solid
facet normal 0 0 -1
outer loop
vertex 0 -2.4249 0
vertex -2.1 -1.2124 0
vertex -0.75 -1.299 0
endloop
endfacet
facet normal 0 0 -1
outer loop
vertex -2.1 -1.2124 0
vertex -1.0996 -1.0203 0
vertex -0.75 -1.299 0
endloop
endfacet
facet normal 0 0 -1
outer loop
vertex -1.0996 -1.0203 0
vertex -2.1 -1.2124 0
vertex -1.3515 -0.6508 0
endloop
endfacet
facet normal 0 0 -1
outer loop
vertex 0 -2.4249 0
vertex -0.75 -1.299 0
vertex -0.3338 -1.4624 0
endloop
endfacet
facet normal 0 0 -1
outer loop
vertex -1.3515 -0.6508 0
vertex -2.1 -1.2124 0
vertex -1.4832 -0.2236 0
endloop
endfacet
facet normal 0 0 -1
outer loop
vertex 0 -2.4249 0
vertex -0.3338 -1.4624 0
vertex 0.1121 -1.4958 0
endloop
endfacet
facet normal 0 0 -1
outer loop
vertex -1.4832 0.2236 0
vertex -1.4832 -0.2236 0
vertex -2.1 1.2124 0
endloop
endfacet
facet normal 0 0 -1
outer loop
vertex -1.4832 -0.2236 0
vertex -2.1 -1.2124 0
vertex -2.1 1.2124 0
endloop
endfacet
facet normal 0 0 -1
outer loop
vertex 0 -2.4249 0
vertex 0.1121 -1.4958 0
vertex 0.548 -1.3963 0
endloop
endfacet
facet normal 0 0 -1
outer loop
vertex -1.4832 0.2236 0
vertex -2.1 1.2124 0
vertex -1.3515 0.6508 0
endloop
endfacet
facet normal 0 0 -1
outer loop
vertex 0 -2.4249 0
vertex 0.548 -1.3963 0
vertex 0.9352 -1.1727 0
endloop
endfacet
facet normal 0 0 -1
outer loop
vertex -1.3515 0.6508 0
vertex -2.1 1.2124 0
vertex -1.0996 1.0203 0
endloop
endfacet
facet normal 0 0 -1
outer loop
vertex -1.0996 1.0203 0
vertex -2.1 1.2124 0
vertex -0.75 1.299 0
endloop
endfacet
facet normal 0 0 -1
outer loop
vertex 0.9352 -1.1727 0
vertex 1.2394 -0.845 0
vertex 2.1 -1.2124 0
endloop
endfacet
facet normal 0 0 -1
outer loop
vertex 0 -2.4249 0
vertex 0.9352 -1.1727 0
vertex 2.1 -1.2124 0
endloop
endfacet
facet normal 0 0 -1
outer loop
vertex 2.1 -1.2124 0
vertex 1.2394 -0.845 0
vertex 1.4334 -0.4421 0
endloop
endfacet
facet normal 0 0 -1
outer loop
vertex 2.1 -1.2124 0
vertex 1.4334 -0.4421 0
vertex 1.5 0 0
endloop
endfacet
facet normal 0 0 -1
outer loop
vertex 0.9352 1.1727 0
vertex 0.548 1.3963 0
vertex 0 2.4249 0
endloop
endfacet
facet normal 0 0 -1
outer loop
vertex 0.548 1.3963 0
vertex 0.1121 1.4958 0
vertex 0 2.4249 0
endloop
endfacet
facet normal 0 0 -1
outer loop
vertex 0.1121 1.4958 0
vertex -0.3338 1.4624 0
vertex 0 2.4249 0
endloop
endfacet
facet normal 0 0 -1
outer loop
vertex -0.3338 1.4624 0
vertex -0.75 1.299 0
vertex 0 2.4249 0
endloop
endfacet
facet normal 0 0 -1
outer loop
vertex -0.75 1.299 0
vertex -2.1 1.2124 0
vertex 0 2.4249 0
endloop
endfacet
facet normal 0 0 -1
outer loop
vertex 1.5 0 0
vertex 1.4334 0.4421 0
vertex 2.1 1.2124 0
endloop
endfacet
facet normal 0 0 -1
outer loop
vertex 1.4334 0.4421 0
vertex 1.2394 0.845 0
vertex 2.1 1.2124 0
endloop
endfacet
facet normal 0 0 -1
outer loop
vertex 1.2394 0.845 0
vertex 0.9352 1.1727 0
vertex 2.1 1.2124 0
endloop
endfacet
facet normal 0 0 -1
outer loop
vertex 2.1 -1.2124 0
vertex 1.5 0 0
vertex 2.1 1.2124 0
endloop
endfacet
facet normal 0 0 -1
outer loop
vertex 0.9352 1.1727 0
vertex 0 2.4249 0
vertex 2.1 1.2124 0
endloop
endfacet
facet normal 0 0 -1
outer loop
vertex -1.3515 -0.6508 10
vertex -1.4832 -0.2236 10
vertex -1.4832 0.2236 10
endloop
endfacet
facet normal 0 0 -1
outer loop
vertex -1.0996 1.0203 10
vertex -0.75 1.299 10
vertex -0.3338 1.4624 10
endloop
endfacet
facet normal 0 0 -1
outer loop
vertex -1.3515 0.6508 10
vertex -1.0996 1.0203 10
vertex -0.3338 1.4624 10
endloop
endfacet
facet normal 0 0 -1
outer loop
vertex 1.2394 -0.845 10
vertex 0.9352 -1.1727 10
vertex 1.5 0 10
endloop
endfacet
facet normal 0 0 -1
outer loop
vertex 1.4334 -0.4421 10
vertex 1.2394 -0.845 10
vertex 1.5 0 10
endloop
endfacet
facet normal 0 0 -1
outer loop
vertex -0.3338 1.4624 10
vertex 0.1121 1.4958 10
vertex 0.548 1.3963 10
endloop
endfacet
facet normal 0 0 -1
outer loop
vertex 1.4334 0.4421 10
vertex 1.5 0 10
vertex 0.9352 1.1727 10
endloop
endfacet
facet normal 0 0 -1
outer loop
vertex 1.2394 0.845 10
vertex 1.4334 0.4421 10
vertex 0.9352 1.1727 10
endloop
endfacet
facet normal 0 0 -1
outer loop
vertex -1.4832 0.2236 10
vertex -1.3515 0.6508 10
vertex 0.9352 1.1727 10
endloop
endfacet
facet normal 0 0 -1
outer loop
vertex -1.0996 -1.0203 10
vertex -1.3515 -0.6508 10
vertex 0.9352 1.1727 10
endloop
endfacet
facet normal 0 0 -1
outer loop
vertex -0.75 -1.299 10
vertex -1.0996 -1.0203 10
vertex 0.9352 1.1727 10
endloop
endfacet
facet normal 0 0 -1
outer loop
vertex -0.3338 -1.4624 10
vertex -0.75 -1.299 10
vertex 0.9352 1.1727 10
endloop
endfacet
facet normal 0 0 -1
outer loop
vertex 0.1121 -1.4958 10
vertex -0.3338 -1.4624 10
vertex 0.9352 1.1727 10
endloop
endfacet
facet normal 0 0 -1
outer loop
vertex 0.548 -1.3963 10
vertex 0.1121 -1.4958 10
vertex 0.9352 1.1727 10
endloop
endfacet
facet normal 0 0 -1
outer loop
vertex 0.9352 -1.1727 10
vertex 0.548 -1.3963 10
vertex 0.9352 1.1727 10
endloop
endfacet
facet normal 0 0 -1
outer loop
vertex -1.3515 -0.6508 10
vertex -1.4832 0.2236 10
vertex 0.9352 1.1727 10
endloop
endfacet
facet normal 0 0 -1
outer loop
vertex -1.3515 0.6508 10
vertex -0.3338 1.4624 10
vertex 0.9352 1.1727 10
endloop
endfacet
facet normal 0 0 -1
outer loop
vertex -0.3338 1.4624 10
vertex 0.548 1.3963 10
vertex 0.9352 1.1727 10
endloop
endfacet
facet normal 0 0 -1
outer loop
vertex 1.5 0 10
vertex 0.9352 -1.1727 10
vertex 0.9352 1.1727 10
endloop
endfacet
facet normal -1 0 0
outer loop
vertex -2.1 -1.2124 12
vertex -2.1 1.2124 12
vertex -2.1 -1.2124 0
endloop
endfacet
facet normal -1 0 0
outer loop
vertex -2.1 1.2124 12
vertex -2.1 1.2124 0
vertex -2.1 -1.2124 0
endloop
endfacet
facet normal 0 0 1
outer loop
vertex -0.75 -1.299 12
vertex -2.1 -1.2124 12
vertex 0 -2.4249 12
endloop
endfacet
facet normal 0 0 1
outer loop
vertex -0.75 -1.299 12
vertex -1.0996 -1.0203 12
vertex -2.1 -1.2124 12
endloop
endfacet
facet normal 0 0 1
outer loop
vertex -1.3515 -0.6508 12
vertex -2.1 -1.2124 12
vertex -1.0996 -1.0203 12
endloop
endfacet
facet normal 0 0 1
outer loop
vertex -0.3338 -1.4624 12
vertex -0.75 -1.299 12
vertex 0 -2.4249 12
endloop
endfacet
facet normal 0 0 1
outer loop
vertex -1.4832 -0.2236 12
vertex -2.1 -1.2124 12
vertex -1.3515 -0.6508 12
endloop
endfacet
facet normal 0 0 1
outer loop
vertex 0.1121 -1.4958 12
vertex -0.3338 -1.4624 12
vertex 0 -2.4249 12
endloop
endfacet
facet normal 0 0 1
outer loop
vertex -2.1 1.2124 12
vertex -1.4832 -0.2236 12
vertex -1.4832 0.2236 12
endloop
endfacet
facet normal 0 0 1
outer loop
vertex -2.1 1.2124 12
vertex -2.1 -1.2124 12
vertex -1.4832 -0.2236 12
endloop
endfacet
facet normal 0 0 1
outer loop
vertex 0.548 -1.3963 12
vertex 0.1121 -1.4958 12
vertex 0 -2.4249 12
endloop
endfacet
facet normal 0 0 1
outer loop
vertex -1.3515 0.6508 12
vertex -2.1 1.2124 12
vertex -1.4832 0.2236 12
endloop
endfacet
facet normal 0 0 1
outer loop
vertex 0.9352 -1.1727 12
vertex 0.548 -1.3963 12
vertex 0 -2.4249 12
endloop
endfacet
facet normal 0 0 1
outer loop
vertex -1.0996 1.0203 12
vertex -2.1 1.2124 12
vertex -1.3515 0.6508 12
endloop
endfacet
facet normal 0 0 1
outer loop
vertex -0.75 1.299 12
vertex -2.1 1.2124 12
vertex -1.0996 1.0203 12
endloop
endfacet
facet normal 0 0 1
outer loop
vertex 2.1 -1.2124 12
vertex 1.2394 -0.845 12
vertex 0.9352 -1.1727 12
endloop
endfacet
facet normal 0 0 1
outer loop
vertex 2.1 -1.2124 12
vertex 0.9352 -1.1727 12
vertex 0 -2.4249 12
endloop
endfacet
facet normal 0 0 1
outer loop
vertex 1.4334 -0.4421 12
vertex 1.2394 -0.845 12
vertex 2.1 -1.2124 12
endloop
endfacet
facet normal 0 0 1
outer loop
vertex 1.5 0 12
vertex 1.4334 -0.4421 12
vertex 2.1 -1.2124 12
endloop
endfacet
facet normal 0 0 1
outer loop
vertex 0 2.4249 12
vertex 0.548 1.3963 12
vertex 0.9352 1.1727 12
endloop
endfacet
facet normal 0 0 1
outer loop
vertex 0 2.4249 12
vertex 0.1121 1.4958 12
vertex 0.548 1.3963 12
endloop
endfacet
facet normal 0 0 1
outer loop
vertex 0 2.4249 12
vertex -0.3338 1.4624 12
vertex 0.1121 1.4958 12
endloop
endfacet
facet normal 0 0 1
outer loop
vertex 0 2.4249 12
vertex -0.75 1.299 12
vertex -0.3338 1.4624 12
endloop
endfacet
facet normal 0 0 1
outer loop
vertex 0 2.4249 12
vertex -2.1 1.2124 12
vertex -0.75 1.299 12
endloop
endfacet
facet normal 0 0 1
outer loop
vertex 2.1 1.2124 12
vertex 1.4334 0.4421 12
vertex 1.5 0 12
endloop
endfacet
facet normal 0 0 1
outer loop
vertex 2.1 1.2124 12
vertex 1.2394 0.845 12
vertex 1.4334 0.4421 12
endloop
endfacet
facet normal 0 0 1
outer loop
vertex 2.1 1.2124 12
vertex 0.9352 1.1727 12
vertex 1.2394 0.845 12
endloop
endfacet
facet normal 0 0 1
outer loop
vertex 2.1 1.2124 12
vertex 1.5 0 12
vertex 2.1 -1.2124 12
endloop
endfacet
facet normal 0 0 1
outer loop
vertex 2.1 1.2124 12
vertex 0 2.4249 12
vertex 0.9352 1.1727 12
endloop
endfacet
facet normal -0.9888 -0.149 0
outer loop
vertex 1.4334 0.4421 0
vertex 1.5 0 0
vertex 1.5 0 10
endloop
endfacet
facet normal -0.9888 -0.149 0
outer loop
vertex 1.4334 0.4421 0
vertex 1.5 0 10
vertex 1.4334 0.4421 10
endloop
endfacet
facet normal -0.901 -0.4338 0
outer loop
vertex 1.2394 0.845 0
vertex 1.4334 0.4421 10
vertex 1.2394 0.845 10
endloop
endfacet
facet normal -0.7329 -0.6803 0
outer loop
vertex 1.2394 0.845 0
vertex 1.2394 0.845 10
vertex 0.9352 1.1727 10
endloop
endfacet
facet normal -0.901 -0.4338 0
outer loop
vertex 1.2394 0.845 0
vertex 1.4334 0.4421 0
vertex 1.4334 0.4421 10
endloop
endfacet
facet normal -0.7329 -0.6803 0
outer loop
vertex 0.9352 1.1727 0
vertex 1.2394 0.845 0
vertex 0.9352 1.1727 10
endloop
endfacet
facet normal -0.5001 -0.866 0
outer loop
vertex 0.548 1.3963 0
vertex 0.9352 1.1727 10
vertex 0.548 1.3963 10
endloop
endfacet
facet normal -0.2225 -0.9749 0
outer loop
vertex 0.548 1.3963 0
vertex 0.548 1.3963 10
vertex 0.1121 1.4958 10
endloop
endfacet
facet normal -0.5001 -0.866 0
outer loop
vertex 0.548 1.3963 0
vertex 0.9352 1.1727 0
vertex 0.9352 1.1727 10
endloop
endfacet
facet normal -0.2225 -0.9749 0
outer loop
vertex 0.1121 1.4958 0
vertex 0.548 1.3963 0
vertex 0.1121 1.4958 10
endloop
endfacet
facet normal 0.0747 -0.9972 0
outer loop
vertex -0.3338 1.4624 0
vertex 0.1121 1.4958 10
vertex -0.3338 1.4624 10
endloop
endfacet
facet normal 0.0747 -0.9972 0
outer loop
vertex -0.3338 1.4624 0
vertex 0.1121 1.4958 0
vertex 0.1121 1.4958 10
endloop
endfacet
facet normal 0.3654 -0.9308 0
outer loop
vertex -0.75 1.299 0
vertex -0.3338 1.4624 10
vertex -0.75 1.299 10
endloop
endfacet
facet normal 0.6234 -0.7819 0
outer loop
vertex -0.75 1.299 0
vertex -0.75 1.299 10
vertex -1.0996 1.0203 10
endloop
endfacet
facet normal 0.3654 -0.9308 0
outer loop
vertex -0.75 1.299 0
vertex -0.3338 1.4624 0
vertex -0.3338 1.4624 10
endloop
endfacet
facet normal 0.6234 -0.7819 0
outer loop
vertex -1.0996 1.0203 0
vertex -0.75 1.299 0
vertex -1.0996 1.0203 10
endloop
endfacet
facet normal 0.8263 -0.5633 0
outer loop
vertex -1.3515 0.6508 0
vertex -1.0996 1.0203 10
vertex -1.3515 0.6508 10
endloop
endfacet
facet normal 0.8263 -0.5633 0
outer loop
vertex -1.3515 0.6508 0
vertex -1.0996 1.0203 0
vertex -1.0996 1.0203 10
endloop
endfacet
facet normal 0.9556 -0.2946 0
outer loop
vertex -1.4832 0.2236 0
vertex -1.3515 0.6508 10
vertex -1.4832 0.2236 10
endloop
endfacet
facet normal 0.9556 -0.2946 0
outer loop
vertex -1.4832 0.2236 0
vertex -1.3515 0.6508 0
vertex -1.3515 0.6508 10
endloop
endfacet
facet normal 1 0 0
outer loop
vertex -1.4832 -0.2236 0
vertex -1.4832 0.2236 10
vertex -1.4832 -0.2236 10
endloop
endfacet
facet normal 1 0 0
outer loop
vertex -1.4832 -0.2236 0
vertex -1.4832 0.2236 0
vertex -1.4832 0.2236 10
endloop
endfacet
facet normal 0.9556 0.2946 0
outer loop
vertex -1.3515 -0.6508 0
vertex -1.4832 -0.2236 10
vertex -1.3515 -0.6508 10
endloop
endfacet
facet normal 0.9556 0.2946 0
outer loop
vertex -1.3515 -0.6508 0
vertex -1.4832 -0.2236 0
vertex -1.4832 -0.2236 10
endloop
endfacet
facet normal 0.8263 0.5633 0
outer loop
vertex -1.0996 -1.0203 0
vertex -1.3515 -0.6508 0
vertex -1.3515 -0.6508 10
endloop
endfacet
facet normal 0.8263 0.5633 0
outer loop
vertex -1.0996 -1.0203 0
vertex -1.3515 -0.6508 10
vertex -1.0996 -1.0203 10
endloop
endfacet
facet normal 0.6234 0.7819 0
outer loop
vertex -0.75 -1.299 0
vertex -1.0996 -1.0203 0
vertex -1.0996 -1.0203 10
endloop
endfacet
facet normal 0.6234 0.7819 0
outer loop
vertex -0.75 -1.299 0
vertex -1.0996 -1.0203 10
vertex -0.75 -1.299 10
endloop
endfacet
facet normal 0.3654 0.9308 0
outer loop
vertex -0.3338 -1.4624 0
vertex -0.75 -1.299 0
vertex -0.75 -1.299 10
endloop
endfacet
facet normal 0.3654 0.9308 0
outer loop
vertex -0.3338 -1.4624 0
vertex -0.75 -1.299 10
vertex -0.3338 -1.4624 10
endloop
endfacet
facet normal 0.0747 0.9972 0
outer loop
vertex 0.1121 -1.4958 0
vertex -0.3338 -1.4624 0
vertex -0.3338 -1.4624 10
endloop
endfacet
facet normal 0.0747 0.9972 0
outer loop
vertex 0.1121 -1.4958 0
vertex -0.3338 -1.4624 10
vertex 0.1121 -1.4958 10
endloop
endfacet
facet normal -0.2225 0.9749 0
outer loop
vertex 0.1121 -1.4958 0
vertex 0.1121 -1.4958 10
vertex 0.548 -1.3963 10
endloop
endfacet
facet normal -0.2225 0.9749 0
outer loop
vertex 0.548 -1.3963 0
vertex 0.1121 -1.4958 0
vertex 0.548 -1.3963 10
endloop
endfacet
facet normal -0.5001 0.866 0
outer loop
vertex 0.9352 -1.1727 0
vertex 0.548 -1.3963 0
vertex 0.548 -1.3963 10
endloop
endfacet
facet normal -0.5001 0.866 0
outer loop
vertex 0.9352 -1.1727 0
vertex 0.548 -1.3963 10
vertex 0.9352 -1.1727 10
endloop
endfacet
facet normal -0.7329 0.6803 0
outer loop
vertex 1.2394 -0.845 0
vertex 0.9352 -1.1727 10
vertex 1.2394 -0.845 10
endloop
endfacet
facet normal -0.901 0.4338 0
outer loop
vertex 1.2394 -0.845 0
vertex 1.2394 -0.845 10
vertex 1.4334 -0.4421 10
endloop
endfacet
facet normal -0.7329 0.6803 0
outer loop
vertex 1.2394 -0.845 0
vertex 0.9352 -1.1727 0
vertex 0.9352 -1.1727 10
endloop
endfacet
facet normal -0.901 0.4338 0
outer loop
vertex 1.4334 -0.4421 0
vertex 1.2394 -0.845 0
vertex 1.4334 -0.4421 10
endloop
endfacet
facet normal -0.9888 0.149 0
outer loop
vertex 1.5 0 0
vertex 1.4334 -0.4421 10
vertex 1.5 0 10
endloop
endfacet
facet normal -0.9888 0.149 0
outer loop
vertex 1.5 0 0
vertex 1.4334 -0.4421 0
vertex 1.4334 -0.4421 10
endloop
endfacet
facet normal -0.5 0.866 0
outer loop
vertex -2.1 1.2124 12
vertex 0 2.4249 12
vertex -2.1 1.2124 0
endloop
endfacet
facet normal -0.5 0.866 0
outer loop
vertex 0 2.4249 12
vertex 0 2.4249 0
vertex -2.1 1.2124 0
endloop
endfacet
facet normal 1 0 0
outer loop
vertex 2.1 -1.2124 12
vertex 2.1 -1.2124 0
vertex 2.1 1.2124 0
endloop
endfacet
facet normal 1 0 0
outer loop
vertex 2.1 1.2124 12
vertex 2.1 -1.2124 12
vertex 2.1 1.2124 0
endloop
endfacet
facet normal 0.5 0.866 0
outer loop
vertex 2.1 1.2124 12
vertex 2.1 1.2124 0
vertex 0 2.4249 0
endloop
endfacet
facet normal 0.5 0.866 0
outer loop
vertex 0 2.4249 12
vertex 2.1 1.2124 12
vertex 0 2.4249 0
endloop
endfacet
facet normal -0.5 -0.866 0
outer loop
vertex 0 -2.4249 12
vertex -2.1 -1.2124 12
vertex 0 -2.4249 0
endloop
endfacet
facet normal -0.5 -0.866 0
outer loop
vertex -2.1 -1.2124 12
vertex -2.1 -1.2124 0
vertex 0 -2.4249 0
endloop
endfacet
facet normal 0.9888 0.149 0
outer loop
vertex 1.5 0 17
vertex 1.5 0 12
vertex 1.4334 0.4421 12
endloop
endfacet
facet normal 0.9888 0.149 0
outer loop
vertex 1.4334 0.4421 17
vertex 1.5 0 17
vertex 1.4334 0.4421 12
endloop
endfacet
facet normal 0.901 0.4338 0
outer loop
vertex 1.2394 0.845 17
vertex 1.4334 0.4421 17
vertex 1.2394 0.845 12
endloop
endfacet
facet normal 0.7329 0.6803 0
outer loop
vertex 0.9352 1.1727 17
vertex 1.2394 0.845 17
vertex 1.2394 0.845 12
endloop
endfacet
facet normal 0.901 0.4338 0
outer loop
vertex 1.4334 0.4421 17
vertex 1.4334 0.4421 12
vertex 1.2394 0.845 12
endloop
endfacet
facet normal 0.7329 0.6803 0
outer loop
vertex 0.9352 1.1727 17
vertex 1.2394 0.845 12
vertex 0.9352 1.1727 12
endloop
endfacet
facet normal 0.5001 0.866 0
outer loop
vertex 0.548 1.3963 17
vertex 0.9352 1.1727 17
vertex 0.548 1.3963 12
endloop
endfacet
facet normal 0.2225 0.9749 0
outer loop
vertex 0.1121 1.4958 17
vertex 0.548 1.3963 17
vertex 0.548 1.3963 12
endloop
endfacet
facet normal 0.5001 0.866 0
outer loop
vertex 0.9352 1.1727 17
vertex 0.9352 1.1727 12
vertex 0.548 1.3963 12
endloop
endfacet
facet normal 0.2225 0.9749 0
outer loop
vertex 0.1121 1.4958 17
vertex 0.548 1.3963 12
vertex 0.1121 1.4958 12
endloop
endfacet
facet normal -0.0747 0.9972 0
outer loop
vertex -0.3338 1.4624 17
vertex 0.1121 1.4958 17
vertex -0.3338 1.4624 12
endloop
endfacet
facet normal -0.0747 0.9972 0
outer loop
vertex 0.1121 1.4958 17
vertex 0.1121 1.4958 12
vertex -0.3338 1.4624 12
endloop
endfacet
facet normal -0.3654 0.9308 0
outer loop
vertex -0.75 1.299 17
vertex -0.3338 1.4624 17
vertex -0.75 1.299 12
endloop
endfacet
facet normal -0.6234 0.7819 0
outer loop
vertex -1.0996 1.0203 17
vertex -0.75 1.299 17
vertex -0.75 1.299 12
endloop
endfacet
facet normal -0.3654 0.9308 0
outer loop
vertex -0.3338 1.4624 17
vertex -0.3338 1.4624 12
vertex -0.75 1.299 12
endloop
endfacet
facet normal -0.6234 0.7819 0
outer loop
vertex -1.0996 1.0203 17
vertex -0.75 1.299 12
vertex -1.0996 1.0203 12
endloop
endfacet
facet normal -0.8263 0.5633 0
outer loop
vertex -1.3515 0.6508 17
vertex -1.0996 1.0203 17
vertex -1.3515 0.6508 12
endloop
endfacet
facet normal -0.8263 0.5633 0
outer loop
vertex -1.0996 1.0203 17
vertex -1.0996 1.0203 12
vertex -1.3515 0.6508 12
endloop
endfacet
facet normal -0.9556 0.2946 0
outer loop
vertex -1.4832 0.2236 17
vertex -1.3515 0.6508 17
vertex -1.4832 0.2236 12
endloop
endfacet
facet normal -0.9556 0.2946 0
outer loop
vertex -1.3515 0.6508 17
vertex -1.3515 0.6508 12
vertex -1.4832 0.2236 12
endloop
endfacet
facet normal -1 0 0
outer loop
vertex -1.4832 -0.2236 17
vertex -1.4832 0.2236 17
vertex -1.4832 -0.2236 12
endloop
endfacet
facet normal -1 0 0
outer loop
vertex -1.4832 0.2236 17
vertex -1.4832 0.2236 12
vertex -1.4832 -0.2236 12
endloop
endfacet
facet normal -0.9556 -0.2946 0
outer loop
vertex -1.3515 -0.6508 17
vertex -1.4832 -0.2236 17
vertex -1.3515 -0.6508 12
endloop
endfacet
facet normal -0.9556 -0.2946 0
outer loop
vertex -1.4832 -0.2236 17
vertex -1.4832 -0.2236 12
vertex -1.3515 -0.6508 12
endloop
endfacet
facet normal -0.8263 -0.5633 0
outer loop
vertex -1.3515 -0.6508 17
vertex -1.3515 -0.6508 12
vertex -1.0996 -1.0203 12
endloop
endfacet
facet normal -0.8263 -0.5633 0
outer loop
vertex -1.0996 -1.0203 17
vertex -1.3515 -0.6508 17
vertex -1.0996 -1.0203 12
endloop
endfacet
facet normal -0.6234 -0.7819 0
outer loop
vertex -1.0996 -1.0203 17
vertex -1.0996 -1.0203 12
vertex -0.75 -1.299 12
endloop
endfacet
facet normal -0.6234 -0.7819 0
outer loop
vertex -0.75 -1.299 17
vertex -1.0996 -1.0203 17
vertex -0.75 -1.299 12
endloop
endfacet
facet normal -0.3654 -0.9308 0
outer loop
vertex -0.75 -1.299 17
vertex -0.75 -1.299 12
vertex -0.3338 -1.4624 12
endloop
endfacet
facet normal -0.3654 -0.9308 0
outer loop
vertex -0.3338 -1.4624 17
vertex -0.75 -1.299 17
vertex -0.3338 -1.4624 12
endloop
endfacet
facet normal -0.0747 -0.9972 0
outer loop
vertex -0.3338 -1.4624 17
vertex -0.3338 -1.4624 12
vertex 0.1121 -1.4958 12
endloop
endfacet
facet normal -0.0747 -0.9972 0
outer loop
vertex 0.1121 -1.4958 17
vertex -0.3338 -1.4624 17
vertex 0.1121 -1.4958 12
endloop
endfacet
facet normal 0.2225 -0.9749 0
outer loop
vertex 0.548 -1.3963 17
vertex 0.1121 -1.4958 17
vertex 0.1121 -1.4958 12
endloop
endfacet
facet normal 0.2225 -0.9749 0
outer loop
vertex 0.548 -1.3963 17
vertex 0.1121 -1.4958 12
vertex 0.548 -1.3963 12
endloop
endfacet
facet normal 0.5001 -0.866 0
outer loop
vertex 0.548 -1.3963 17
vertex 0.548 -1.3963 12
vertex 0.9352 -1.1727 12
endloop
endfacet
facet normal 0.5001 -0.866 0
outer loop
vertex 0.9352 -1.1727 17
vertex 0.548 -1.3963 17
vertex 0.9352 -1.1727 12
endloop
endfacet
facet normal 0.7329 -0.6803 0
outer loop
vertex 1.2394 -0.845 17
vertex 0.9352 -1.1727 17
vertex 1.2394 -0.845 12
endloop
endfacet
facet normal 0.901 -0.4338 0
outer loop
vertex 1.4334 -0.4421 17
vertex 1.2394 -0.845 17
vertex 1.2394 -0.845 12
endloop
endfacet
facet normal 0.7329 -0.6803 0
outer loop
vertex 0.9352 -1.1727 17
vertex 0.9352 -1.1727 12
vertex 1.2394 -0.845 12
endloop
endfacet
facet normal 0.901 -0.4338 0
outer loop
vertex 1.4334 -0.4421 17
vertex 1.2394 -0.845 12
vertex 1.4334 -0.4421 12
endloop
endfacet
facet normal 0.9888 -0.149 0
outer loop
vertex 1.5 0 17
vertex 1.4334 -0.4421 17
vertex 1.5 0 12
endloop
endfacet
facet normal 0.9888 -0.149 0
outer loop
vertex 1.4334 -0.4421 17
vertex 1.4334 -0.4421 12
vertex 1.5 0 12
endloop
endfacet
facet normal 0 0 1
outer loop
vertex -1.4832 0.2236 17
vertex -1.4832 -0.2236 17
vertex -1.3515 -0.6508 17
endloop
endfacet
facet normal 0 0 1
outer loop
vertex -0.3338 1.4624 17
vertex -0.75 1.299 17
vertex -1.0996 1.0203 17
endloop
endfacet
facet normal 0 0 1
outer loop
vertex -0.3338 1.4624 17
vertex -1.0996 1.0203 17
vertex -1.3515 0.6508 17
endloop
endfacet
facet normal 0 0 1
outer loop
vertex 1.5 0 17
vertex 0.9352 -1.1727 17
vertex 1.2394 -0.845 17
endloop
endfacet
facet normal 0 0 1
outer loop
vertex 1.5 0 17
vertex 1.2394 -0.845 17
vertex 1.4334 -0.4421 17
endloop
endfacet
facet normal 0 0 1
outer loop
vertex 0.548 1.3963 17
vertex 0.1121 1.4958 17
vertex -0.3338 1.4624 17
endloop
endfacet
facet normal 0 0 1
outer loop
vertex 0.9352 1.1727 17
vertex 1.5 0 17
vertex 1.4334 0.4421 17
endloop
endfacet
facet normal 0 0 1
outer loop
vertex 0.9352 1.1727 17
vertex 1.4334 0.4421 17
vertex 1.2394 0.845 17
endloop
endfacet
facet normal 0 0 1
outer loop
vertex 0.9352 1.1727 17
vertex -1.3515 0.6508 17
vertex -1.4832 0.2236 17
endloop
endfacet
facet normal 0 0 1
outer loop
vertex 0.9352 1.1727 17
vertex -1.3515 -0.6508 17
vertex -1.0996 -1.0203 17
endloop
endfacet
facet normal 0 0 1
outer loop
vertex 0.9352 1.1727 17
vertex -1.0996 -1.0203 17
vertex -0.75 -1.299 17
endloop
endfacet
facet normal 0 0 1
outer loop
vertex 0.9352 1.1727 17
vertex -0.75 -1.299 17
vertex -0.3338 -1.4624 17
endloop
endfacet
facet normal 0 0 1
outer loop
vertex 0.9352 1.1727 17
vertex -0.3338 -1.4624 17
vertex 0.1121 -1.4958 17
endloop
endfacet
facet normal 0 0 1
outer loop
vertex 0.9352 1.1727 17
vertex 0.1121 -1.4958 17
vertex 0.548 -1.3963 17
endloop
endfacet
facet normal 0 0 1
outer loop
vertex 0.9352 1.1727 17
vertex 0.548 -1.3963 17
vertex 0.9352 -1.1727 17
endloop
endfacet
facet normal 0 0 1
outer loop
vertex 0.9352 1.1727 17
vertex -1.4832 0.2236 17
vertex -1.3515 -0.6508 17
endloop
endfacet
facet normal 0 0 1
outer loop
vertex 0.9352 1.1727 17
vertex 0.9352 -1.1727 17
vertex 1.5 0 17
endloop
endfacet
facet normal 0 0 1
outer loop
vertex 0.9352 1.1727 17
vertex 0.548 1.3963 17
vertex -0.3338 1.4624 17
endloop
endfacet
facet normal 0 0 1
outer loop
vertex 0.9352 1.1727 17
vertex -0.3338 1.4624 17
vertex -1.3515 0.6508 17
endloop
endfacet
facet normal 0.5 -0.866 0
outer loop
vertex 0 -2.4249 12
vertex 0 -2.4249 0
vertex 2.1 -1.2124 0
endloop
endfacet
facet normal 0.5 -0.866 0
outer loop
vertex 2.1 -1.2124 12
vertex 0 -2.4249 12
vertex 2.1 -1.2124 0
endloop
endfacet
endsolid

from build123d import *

# Parameters (mm, degrees)
SKETCH_1_R      = 1.5
EXTRUDE_1_DEPTH = 10
EXTRUDE_2_DEPTH = 2
SKETCH_3_R      = 1.5
EXTRUDE_3_DEPTH = 5


with BuildPart() as part:
    # 草图1 → 凸台-拉伸1 (new body)
    with BuildSketch(Plane.XY):
        Polygon((0, 2.424871131), (-2.1, 1.212435565), (-2.1, -1.212435565), (0, -2.424871131), (2.1, -1.212435565), (2.1, 1.212435565), align=None)
        Circle(SKETCH_1_R, mode=Mode.SUBTRACT)
    extrude(amount=EXTRUDE_1_DEPTH)

    # 草图2 → 凸台-拉伸2 (add)
    with BuildSketch(Plane.XY.offset(10)):
        Polygon((2.1, 1.212435565), (0, 2.424871131), (-2.1, 1.212435565), (-2.1, -1.212435565), (0, -2.424871131), (2.1, -1.212435565), align=None)
    extrude(amount=EXTRUDE_2_DEPTH)

    # 草图3 → 凸台-拉伸3 (add)
    with BuildSketch(Plane.XY.offset(12)):
        Circle(SKETCH_3_R)
    extrude(amount=EXTRUDE_3_DEPTH)


solid = part.part
